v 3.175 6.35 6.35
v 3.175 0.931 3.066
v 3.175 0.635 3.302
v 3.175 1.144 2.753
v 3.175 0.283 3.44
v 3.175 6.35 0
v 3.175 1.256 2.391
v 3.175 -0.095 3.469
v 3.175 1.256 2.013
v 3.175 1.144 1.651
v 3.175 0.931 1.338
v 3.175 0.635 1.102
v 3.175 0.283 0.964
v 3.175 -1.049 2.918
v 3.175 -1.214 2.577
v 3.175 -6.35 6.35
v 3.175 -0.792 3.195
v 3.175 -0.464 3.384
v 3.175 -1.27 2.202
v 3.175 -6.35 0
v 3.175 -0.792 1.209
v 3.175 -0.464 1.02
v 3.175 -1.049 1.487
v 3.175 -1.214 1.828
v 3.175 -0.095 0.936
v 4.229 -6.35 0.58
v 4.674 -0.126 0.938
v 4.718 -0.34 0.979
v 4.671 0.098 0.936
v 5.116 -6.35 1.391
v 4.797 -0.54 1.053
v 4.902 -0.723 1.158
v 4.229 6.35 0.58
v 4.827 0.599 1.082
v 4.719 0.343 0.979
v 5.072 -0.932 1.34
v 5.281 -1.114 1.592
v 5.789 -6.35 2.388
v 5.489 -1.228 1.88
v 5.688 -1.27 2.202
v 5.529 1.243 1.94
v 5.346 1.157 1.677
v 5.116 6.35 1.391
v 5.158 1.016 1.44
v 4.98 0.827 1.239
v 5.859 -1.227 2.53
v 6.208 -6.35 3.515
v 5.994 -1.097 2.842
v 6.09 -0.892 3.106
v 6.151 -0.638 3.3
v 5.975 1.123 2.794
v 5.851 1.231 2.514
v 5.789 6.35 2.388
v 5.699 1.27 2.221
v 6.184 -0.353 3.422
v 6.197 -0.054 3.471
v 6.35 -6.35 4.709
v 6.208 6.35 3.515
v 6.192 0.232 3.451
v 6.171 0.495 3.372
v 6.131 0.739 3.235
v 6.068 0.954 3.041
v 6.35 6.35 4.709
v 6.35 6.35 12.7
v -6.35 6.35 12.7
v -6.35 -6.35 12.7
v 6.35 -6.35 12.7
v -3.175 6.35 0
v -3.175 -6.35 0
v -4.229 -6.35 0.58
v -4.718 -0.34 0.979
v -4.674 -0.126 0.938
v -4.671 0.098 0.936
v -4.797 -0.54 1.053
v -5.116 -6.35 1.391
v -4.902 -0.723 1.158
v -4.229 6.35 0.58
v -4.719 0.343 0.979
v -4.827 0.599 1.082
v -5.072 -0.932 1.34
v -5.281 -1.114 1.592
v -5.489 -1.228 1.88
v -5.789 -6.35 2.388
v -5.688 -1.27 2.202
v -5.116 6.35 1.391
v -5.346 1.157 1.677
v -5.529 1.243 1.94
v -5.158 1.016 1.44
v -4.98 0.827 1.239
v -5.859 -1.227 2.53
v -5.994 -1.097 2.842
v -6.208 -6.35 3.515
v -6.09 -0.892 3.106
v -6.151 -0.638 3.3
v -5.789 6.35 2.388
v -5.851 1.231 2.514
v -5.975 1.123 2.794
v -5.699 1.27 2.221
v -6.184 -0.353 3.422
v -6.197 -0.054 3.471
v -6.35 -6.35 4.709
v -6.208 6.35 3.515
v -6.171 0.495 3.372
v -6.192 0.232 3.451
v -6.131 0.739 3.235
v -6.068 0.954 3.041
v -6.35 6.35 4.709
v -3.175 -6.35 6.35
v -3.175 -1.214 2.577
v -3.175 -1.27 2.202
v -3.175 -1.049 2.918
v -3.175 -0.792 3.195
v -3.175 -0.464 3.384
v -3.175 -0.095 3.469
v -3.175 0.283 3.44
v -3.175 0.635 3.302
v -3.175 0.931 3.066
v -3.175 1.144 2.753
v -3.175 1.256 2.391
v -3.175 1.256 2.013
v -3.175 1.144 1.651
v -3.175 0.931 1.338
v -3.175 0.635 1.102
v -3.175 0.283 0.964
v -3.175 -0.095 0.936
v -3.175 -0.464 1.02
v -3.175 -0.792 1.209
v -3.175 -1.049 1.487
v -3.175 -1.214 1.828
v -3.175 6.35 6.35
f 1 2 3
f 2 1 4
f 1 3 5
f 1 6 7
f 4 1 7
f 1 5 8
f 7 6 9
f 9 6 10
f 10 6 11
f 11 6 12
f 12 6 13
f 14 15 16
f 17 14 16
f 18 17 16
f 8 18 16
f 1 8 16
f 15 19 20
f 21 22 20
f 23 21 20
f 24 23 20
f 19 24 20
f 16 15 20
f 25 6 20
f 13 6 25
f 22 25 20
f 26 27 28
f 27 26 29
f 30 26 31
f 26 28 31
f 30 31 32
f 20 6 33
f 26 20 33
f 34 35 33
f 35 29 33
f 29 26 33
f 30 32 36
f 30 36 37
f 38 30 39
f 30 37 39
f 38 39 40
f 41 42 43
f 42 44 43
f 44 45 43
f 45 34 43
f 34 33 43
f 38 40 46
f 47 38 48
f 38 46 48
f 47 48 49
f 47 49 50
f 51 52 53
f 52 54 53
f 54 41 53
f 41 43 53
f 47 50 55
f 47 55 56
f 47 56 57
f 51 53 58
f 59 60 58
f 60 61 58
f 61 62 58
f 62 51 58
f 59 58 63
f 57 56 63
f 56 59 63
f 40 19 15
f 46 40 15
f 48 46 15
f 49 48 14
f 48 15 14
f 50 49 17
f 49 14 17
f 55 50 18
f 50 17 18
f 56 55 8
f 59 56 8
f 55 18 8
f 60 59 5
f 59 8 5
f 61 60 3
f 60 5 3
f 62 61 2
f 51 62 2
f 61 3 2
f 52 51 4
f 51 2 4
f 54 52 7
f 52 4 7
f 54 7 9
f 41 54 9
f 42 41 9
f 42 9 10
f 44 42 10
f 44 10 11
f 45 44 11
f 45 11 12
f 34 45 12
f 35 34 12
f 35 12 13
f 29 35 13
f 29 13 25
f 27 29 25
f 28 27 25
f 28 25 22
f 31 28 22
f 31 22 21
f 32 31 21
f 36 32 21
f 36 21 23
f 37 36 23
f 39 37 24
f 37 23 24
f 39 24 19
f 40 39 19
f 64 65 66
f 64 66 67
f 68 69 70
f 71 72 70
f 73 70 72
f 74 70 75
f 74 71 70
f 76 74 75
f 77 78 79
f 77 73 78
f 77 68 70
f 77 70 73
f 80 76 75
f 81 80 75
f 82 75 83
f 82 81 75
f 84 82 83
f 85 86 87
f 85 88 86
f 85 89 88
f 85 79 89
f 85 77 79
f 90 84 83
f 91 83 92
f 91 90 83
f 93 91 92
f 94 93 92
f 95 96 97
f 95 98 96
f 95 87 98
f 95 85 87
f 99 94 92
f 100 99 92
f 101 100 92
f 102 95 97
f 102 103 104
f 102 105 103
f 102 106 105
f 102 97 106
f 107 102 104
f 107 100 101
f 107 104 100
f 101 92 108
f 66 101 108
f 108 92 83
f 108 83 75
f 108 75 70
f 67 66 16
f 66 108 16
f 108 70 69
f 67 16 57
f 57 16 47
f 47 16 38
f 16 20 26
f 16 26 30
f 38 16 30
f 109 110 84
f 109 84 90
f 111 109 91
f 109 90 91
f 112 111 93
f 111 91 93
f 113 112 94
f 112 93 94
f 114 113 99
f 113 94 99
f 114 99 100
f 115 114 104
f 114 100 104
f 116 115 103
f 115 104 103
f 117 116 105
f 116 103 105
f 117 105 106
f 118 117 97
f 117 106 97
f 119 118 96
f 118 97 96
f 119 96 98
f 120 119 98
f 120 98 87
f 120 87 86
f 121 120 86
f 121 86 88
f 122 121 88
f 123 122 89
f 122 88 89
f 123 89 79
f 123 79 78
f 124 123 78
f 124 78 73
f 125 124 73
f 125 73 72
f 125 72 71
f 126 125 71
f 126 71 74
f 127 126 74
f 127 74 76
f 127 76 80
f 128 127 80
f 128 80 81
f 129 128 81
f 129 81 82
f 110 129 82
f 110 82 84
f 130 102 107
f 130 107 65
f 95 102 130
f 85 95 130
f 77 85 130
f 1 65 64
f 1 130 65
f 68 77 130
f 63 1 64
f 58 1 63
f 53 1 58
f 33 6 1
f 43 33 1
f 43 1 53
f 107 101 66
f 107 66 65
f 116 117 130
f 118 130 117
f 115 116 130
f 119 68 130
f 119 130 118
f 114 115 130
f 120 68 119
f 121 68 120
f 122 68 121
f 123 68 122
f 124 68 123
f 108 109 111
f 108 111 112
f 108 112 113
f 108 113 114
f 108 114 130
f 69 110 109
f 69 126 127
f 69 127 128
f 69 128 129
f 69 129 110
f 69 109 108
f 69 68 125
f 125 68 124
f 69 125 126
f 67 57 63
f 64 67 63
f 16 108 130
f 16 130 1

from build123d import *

# Parameters (mm, degrees)
F0_W        = 12.7
F0_H        = 12.7
F1_DEPTH    = 12.7
F2_W        = 6.35
F2_H        = 35.1087670878
F3_DEPTH    = 6.35
F4_R        = 1.27
F5_DEPTH    = 25.4
F6_T1_DEPTH = 36.2464301965


# Not quite as in the source:
# - a fillet or chamfer that OpenCascade refuses, or shapes differently, is made with other operations: its cross-section is extruded or revolved along the edge and cut away or added


with BuildPart() as f1:
    # F0 (on Top) → F1 (new body)
    with BuildSketch(Plane.XY):
        Rectangle(F0_W, F0_H)
    extrude(amount=F1_DEPTH)

    # F2 (on face) → F3 (cut)
    with BuildSketch(Plane(origin=(0, 0, 0), x_dir=(1, 0, 0), z_dir=(0, 0, -1))):
        Rectangle(F2_W, F2_H)
    extrude(amount=-F3_DEPTH, mode=Mode.SUBTRACT)

    # F4 (on face) → F5 (cut)
    with BuildSketch(Plane(origin=(-6.35, 0, 0), x_dir=(0, -1, 0), z_dir=(-1, 0, 0))):
        with Locations((0, 2.2022052582)):
            Circle(F4_R)
    extrude(amount=-F5_DEPTH, mode=Mode.SUBTRACT)

    # F6: fillet of radius 5.08 on 2 edges, made by hand

    # F6_s2 → F6_t1 (cut)
    with BuildSketch(Plane.XZ.offset(-18.1232150983)):
        with BuildLine():
            ThreePointArc((-3.175, 0), (-5.4821134838, 1.8694797079), (-6.35, 4.7092860393))
            Line((-6.35, 4.7092860393), (-6.35, 0))
            Line((-6.35, 0), (-3.175, 0))
        make_face()
        with BuildLine():
            ThreePointArc((3.175, 0), (5.4821134838, 1.8694797079), (6.35, 4.7092860393))
            Line((6.35, 4.7092860393), (6.35, 0))
            Line((6.35, 0), (3.175, 0))
        make_face()
    extrude(amount=F6_T1_DEPTH, mode=Mode.SUBTRACT)


solid = f1.part
